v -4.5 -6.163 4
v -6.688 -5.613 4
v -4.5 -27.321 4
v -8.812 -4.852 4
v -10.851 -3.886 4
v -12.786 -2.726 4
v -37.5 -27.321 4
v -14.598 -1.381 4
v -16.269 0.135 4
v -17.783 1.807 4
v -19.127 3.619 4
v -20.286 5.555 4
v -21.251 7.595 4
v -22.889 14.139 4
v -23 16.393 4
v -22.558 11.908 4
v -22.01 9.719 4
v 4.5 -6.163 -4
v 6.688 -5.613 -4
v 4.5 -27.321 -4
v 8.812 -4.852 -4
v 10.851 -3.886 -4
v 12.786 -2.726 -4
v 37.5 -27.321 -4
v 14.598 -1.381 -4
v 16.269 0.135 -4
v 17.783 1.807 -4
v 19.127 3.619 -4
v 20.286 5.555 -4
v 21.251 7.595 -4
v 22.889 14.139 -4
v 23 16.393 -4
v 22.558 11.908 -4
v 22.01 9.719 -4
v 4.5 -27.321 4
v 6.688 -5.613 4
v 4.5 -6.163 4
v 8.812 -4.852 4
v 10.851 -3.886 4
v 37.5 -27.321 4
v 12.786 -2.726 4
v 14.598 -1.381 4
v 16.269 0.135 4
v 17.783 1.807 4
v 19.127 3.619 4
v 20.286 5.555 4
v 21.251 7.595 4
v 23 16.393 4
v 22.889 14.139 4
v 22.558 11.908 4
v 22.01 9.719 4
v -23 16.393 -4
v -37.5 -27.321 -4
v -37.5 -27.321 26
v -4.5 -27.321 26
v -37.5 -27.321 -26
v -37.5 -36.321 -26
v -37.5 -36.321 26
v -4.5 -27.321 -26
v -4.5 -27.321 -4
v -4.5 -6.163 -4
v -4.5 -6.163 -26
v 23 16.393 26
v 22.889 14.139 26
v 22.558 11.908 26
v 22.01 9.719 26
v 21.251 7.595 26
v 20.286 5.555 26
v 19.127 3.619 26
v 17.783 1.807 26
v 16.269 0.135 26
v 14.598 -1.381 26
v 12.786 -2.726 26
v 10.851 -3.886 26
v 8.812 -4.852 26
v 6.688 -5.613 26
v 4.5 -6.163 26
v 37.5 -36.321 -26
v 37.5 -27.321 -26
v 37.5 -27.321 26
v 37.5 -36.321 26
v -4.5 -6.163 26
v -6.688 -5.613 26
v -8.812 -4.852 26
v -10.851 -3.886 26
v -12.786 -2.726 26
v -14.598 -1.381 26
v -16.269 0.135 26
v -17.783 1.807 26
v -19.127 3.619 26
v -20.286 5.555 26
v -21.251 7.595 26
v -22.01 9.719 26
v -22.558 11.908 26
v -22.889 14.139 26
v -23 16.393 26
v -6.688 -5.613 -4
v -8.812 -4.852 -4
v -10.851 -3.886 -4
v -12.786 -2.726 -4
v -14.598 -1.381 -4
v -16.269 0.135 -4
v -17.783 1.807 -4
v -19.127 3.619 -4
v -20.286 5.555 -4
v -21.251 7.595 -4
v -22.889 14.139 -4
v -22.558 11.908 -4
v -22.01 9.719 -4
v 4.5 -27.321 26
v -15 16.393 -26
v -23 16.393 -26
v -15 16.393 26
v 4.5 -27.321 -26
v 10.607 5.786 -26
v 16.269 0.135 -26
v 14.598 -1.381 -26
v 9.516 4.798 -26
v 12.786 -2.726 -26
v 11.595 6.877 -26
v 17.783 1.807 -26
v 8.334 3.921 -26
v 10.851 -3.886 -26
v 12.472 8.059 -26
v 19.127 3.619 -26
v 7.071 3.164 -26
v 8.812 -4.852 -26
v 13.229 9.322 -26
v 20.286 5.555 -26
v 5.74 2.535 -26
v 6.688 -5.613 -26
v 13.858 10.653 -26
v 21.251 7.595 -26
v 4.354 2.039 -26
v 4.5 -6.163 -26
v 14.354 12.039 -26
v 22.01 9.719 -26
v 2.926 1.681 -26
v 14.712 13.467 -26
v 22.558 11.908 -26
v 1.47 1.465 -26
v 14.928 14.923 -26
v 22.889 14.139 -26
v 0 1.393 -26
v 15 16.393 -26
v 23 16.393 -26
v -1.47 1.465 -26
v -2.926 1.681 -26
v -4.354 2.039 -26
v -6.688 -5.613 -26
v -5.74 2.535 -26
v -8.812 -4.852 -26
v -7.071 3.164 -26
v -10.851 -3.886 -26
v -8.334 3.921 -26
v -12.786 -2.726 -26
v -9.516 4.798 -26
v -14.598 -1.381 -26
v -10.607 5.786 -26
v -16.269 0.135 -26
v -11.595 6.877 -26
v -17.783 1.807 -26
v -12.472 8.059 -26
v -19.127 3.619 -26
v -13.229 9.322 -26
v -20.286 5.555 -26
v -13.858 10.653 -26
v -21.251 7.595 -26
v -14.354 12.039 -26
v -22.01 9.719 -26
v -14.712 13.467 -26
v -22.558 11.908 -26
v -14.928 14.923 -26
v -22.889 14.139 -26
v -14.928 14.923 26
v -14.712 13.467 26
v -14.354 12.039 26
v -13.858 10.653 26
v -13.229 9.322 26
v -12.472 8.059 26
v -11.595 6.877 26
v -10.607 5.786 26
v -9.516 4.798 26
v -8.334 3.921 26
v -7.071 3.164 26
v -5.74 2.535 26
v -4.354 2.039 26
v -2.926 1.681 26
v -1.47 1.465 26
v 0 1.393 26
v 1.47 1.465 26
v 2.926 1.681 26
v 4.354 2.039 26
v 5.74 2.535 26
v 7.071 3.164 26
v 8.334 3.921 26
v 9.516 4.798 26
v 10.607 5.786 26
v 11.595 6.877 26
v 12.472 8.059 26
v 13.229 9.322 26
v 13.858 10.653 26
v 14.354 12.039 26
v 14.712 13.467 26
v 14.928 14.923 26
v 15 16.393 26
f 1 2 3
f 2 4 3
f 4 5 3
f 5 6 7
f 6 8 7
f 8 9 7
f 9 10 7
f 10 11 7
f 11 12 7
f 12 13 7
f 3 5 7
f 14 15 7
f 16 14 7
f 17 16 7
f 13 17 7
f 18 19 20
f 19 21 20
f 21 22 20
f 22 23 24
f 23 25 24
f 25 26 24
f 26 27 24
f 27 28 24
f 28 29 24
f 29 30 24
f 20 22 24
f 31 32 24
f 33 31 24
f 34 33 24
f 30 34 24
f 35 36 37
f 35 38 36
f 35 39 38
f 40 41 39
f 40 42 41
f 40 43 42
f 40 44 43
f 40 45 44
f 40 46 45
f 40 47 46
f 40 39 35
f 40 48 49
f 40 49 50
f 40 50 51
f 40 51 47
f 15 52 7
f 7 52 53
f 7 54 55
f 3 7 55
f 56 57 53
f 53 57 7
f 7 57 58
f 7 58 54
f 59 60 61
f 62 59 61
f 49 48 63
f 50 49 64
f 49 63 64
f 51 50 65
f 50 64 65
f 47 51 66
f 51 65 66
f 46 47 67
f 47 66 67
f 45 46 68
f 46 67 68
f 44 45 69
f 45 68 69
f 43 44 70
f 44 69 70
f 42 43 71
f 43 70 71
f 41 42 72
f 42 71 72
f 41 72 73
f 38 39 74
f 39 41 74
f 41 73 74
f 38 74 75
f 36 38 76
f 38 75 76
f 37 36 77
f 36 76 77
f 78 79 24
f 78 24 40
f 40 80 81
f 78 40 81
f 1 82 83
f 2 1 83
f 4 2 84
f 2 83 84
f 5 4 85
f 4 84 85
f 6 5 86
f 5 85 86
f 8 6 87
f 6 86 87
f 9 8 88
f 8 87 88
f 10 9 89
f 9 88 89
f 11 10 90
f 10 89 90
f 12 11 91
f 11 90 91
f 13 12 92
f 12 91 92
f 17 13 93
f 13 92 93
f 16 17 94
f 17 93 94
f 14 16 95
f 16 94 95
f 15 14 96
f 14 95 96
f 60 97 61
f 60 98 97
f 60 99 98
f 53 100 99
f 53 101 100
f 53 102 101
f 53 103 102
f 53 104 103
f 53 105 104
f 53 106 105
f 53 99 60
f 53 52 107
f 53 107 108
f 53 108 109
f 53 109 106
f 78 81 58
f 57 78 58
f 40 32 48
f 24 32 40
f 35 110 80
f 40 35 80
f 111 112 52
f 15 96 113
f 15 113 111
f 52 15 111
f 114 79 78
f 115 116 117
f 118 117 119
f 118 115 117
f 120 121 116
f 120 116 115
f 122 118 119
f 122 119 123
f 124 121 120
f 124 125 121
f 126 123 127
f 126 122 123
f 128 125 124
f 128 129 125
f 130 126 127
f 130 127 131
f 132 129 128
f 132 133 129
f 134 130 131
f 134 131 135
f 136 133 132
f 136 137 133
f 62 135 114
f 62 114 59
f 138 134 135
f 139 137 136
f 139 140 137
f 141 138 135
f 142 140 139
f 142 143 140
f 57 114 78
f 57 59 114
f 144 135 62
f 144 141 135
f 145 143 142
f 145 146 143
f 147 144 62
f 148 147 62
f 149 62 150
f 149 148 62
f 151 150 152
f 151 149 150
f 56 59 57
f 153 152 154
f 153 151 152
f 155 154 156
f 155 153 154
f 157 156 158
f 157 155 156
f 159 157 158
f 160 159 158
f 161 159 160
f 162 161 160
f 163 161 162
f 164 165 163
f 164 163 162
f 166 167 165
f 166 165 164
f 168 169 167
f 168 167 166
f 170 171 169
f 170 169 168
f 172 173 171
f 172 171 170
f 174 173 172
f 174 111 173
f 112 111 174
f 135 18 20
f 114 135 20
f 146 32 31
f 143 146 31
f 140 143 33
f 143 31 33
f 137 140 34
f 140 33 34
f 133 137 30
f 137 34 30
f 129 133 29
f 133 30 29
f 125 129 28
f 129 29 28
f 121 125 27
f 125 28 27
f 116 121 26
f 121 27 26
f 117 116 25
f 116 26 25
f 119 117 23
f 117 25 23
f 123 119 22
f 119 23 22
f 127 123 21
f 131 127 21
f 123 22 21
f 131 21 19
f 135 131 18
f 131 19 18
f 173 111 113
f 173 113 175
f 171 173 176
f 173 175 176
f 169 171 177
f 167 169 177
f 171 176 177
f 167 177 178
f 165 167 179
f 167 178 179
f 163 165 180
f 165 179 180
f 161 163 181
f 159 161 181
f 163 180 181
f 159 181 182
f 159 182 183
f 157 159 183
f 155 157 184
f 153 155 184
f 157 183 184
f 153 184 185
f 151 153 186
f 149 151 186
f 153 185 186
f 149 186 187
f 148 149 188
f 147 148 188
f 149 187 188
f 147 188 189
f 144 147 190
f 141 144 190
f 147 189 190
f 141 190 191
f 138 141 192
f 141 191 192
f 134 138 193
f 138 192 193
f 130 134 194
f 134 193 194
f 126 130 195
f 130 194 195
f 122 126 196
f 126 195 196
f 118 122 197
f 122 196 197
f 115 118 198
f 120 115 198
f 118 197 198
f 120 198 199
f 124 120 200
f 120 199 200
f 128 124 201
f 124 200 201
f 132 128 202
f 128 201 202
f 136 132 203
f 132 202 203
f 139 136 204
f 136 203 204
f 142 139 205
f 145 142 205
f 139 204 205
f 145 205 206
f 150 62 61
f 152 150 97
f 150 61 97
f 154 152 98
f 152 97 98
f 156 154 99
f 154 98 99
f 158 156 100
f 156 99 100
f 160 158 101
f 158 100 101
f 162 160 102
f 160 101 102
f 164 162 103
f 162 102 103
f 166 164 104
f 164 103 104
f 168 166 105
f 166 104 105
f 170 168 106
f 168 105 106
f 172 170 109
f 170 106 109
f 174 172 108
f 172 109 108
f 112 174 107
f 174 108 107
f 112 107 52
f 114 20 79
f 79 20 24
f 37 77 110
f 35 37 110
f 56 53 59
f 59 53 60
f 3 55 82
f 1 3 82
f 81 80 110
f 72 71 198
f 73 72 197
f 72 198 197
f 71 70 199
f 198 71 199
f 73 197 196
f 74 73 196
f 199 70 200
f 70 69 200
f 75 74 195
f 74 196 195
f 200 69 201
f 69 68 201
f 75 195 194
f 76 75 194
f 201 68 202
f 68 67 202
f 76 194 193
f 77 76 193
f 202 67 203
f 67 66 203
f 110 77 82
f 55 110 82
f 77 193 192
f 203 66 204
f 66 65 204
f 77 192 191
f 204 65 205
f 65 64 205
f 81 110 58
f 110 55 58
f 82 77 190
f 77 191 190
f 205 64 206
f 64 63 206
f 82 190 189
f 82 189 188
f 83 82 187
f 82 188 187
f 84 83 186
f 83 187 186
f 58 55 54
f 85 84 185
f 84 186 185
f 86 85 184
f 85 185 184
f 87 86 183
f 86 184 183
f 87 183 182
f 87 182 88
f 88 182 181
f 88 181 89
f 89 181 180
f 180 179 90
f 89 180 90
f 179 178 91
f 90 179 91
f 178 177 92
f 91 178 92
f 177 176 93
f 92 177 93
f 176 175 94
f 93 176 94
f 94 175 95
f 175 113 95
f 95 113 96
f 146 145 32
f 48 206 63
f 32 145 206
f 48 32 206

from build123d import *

# Parameters (mm, degrees)
BOSS_EXTRUDE2_DEPTH = 26
RIB1_REACH          = 60.322
SKETCH5_WALL_W      = 164.701059438
SKETCH5_WALL_H      = 8


with BuildPart() as part:
    # Sketch3 → Boss-Extrude2 (new, symmetric)
    with BuildSketch(Plane.XY):
        with BuildLine():
            Line((-37.5, -27.321428571), (-4.5, -27.321428571))
            Line((-4.5, -27.321428571), (-4.5, -6.162629994))
            ThreePointArc((-4.5, -6.162629994), (-17.783419244, 1.806904997), (-23, 16.392857143))
            Line((-23, 16.392857143), (-15, 16.392857143))
            ThreePointArc((-15, 16.392857143), (0, 1.392857143), (15, 16.392857143))
            Line((15, 16.392857143), (23, 16.392857143))
            ThreePointArc((23, 16.392857143), (17.783419244, 1.806904997), (4.5, -6.162629994))
            Line((4.5, -6.162629994), (4.5, -27.321428571))
            Line((4.5, -27.321428571), (37.5, -27.321428571))
            Line((37.5, -27.321428571), (37.5, -36.321428571))
            Line((37.5, -36.321428571), (-37.5, -36.321428571))
            Line((-37.5, -36.321428571), (-37.5, -27.321428571))
        make_face()
    extrude(amount=BOSS_EXTRUDE2_DEPTH, both=True)

    # Sketch5 wall → Rib1 (add, up to next)
    with BuildSketch(Plane(origin=(30.25, -5.464285714, 0), x_dir=(0.314831618537, -0.949147539622, 0), z_dir=(0.949147539622, 0.314831618537, 0)), mode=Mode.PRIVATE) as rib1_sk1:
        Rectangle(SKETCH5_WALL_W, SKETCH5_WALL_H)
    rib1_tool1 = extrude(rib1_sk1.sketch, amount=-RIB1_REACH, mode=Mode.PRIVATE) - part.part
    rib1 = rib1_tool1.solids().sort_by_distance((30.25, -5.464285714, 0))[0]
    add(rib1)

    # Mirror1: Rib1 across plane
    add(rib1.mirror(Plane(origin=(0, 0, 0), x_dir=(0, 0, 1), z_dir=(1, 0, 0))))


solid = part.part
